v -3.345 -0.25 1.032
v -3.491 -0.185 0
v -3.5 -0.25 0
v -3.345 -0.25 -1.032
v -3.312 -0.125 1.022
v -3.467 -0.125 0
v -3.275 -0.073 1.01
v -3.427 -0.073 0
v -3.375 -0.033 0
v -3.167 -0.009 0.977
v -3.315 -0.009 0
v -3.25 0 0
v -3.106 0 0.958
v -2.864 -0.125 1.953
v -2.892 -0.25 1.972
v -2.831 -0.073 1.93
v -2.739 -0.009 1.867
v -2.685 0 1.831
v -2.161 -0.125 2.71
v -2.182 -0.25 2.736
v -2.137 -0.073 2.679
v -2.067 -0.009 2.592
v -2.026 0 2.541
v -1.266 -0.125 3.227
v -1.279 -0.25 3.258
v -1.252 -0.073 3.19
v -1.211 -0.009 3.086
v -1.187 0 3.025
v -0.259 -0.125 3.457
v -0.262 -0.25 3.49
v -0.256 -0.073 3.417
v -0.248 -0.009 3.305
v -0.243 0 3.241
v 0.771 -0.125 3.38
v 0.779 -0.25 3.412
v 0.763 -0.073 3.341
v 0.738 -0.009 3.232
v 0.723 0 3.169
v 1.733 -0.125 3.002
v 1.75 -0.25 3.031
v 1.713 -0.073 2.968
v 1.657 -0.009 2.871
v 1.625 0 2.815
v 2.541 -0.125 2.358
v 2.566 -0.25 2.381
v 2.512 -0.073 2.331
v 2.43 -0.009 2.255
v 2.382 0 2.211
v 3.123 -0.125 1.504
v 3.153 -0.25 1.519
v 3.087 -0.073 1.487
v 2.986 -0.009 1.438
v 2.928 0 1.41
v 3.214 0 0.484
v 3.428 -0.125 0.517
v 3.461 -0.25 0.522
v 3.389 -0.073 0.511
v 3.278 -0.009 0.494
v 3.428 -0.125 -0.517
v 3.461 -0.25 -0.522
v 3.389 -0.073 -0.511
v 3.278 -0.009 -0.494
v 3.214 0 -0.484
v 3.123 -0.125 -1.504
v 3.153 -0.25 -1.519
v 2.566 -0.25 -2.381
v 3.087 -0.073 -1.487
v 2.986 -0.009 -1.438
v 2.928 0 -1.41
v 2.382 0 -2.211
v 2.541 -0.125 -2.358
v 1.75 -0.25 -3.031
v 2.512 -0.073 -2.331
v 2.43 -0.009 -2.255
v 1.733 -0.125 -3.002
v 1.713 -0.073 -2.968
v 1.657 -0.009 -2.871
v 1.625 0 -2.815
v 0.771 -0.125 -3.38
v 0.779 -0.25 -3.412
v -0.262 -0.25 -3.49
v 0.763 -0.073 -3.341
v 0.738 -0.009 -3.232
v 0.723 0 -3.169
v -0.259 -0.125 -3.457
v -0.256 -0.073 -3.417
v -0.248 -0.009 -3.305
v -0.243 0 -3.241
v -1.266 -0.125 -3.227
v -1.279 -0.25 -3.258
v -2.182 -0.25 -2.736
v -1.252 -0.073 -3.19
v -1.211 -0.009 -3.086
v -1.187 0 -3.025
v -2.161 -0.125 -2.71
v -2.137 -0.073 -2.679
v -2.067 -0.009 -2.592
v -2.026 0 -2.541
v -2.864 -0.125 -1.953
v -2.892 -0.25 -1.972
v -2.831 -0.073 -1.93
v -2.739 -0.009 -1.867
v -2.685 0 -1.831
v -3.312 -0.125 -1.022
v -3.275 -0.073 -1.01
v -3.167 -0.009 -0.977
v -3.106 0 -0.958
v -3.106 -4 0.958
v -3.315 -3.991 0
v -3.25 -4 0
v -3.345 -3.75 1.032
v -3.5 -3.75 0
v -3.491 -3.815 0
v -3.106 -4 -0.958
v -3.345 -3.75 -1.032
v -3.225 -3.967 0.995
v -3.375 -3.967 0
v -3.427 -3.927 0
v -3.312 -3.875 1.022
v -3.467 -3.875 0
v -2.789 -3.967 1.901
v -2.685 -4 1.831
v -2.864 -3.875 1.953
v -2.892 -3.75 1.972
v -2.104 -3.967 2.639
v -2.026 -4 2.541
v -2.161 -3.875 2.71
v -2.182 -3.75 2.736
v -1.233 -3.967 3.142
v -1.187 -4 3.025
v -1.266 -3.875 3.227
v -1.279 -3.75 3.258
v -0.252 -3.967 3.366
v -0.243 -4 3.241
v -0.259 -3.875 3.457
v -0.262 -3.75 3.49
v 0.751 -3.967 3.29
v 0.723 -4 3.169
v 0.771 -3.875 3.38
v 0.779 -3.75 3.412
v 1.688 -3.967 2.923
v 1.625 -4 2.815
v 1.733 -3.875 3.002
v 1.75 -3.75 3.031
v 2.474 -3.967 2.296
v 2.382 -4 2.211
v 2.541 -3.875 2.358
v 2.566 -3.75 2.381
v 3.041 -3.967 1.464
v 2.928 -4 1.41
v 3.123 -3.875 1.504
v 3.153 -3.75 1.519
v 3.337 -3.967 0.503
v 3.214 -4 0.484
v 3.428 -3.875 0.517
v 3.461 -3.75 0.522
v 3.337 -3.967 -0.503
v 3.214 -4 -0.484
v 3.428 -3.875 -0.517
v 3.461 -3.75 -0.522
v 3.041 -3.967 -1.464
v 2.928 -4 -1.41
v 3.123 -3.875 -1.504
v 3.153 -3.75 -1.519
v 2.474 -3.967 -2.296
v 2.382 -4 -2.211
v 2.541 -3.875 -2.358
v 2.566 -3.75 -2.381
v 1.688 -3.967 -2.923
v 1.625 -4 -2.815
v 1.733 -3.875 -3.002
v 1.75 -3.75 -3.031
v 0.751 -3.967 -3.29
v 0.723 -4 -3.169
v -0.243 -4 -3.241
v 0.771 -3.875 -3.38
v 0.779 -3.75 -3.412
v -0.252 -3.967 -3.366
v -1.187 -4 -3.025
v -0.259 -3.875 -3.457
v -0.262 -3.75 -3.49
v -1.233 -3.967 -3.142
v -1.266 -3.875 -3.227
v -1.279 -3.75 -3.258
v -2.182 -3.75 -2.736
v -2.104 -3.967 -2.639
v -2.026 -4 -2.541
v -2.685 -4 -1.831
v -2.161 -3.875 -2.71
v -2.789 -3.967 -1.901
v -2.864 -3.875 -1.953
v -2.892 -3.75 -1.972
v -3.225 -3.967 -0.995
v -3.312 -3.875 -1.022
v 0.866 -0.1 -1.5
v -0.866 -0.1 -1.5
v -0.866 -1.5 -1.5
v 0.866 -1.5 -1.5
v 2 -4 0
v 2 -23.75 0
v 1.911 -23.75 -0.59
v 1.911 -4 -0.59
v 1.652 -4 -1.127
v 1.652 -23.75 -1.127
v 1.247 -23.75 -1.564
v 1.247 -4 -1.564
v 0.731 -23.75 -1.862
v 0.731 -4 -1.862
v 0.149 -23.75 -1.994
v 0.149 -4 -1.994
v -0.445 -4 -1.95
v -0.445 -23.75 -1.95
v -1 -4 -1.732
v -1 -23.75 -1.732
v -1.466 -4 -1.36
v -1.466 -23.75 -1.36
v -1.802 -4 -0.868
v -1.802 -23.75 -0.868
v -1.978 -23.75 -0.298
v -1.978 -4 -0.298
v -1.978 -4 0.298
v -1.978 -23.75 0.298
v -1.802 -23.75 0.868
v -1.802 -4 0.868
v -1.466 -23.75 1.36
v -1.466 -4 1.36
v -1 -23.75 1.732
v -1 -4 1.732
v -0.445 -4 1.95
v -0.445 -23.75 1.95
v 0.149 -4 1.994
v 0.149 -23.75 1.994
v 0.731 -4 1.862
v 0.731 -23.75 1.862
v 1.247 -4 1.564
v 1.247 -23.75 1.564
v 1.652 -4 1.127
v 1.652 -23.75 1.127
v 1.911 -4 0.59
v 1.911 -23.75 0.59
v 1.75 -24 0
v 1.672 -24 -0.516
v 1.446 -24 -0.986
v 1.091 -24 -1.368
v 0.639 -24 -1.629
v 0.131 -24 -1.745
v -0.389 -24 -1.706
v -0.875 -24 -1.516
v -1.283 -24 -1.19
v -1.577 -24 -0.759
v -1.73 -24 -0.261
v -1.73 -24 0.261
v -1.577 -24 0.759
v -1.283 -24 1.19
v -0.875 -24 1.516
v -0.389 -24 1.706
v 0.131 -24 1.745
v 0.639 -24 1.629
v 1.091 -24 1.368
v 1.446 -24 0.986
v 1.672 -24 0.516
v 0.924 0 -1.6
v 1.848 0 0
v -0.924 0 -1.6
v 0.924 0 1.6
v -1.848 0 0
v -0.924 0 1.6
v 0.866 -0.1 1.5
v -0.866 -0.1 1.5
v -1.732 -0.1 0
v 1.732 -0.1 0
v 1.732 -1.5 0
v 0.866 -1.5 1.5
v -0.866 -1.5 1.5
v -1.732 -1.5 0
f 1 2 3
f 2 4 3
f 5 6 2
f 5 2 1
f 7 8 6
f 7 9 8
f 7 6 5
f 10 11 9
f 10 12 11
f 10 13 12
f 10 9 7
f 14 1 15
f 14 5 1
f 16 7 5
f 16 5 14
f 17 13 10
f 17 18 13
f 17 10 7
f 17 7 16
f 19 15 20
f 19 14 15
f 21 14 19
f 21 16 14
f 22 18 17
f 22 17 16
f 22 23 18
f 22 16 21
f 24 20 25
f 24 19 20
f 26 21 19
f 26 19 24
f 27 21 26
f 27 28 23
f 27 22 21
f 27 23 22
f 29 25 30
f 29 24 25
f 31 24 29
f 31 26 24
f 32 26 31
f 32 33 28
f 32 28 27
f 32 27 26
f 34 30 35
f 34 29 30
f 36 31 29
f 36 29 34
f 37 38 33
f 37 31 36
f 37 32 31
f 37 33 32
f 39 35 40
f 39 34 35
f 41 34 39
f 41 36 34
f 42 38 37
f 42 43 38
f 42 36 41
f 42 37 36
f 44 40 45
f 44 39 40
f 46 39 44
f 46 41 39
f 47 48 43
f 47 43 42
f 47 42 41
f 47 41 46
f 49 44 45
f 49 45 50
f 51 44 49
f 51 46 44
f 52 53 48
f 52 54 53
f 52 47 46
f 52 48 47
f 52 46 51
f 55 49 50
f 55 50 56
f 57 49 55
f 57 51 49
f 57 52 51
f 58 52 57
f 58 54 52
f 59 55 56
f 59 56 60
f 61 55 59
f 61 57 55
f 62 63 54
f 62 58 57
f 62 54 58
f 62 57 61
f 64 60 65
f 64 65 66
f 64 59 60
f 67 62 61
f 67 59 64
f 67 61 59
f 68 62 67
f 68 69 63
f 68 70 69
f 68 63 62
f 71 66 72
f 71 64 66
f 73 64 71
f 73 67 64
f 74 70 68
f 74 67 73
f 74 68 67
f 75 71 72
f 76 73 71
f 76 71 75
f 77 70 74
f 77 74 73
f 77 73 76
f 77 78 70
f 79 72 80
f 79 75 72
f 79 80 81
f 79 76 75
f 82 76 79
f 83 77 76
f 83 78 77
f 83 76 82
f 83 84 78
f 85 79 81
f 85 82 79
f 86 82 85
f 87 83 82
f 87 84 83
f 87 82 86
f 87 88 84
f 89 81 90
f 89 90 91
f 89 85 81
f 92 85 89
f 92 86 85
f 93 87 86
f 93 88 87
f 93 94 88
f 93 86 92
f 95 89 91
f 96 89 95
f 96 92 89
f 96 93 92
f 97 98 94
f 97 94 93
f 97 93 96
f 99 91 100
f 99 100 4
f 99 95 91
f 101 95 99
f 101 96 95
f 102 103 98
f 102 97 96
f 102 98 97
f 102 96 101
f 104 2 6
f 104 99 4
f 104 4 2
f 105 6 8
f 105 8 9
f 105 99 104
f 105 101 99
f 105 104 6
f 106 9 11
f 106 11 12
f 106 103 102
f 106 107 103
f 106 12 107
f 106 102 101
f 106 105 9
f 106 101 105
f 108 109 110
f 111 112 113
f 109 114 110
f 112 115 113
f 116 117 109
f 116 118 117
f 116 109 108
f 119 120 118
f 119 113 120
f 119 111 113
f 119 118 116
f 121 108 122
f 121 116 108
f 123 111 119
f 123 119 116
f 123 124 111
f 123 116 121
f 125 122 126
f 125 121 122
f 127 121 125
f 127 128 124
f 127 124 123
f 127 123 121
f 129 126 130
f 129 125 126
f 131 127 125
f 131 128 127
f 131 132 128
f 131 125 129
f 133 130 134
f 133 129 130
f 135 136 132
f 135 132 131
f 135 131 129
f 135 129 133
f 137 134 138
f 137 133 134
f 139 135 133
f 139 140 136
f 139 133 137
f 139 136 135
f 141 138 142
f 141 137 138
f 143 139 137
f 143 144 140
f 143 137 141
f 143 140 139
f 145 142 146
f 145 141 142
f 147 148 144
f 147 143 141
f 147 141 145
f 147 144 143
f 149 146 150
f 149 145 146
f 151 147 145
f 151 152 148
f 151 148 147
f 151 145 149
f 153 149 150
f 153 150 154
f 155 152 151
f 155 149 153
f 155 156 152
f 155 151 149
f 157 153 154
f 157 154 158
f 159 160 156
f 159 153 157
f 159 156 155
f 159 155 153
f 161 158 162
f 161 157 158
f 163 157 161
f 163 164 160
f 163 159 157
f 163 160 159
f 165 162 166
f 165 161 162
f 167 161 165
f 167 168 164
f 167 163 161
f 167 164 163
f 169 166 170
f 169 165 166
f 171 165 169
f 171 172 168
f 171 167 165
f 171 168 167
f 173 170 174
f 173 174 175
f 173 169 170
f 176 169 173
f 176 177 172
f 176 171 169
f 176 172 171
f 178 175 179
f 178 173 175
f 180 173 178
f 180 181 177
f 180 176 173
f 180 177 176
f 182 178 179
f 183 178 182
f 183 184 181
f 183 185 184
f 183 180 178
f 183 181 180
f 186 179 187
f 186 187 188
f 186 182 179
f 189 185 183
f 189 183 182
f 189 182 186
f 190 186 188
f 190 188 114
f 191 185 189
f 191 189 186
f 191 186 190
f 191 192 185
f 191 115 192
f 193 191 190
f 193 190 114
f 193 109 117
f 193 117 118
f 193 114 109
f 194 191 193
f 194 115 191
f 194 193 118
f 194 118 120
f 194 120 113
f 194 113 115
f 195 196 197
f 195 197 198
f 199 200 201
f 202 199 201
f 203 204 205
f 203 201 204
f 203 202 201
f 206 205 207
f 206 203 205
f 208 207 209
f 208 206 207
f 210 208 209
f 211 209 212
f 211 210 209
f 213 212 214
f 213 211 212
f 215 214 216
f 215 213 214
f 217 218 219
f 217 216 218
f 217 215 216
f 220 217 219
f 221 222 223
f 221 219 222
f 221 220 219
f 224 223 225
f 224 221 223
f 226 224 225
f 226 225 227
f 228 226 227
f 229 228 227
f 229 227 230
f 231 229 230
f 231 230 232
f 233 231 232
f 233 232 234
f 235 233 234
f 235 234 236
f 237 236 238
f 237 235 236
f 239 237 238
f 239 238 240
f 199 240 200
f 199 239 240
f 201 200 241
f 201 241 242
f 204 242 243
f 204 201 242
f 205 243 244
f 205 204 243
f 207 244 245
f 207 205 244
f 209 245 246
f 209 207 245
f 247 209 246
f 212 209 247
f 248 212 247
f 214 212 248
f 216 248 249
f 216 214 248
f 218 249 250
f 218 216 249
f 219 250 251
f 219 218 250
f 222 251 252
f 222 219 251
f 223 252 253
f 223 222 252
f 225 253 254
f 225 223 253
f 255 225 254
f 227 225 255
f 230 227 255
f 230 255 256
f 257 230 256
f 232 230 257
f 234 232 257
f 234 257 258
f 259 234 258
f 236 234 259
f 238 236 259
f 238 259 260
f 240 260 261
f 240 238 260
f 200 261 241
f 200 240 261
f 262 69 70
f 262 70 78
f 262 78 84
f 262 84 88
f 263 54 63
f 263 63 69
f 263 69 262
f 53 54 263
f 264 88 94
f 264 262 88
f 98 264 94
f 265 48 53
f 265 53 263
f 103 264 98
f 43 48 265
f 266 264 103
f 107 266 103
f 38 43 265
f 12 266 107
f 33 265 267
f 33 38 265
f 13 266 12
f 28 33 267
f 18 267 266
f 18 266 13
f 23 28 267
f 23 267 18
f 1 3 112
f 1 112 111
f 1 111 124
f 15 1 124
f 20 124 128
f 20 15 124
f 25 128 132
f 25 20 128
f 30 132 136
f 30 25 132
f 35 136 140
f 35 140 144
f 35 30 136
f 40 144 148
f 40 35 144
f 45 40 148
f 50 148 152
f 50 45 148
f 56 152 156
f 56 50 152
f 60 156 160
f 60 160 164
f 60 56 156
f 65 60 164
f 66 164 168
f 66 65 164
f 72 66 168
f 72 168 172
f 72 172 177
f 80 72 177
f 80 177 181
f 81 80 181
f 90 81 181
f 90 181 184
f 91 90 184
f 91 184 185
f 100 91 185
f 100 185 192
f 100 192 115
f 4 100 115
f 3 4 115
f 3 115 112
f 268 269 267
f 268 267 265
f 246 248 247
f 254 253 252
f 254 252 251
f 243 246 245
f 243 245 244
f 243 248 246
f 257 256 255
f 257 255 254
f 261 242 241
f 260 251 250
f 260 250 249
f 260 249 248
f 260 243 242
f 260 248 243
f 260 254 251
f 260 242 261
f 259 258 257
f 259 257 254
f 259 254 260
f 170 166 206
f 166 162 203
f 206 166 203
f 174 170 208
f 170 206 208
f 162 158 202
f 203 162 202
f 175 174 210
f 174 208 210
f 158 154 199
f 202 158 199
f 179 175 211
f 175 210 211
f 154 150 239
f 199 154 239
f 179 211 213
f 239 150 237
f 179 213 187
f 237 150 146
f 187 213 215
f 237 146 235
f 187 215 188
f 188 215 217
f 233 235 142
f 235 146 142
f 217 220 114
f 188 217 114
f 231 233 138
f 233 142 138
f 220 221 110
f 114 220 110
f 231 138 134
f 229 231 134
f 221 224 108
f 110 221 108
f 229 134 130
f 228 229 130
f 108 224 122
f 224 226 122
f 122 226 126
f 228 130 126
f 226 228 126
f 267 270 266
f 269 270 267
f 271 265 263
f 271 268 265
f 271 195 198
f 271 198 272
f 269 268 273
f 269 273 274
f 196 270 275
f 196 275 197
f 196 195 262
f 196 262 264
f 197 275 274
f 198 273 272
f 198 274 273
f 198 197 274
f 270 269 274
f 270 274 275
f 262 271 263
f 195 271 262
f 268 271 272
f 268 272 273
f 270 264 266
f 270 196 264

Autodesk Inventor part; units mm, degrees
ref_plane "YZ Plane" through (0, 0, 0) normal (1, 0, 0) x (0, 1, 0)
ref_plane "XZ Plane" through (0, 0, 0) normal (0, 1, 0) x (-1, 0, 0)
ref_plane "XY Plane" through (0, 0, 0) normal (0, 0, 1) x (1, 0, 0)
sketch "Sketch1" plane through (0, 0, 0) normal (0, 1, 0) x (-1, 0, 0)
  circle A0 centre (0, 0) radius 3.5
  dimension "d0" = 7
extrude "Extrusion1" add sketch "Sketch1" against normal blind 4
sketch "Sketch2" plane through (0, -4, 0) normal (0, -1, 0) x (1, 0, 0)
  circle A0 centre (0, 0) radius 2
  dimension "d3" = 4
extrude "Extrusion2" add sketch "Sketch2" along normal blind 20
sketch "Sketch3" plane through (0, 0, 0) normal (0, 1, 0) x (1, 0, 0)
  circle A0 centre (0, 0) radius 2 construction
  line L0 (1.7321, 0) -> (0.866, -1.5)
  line L1 (0.866, -1.5) -> (-0.866, -1.5)
  line L2 (-0.866, -1.5) -> (-1.7321, 0)
  line L3 (-1.7321, 0) -> (-0.866, 1.5)
  line L4 (-0.866, 1.5) -> (0.866, 1.5)
  line L5 (0.866, 1.5) -> (1.7321, 0)
  dimension "d8" = 3
extrude "Extrusion3" cut sketch "Sketch3" against normal blind 1.5
chamfer "Chamfer1" distance 0.25 angle 45 1 edges at (-2, -24, 0)
fillet "Fillet1" radius 0.25 2 edges at (3.5, 0, 0) (3.5, -4, 0)
chamfer "Chamfer2" distance 0.1 angle 45 6 edges at (0, 0, -1.5) (1.299, 0, -0.75) (1.299, 0, 0.75) (0, 0, 1.5) (-1.299, 0, 0.75) (-1.299, 0, -0.75)
thread "Thread2" size "M4x0.7" class "6g" standard "ANSI Metric M Profile" full length
properties part number "M4-20" material "Steel, Carbon"
